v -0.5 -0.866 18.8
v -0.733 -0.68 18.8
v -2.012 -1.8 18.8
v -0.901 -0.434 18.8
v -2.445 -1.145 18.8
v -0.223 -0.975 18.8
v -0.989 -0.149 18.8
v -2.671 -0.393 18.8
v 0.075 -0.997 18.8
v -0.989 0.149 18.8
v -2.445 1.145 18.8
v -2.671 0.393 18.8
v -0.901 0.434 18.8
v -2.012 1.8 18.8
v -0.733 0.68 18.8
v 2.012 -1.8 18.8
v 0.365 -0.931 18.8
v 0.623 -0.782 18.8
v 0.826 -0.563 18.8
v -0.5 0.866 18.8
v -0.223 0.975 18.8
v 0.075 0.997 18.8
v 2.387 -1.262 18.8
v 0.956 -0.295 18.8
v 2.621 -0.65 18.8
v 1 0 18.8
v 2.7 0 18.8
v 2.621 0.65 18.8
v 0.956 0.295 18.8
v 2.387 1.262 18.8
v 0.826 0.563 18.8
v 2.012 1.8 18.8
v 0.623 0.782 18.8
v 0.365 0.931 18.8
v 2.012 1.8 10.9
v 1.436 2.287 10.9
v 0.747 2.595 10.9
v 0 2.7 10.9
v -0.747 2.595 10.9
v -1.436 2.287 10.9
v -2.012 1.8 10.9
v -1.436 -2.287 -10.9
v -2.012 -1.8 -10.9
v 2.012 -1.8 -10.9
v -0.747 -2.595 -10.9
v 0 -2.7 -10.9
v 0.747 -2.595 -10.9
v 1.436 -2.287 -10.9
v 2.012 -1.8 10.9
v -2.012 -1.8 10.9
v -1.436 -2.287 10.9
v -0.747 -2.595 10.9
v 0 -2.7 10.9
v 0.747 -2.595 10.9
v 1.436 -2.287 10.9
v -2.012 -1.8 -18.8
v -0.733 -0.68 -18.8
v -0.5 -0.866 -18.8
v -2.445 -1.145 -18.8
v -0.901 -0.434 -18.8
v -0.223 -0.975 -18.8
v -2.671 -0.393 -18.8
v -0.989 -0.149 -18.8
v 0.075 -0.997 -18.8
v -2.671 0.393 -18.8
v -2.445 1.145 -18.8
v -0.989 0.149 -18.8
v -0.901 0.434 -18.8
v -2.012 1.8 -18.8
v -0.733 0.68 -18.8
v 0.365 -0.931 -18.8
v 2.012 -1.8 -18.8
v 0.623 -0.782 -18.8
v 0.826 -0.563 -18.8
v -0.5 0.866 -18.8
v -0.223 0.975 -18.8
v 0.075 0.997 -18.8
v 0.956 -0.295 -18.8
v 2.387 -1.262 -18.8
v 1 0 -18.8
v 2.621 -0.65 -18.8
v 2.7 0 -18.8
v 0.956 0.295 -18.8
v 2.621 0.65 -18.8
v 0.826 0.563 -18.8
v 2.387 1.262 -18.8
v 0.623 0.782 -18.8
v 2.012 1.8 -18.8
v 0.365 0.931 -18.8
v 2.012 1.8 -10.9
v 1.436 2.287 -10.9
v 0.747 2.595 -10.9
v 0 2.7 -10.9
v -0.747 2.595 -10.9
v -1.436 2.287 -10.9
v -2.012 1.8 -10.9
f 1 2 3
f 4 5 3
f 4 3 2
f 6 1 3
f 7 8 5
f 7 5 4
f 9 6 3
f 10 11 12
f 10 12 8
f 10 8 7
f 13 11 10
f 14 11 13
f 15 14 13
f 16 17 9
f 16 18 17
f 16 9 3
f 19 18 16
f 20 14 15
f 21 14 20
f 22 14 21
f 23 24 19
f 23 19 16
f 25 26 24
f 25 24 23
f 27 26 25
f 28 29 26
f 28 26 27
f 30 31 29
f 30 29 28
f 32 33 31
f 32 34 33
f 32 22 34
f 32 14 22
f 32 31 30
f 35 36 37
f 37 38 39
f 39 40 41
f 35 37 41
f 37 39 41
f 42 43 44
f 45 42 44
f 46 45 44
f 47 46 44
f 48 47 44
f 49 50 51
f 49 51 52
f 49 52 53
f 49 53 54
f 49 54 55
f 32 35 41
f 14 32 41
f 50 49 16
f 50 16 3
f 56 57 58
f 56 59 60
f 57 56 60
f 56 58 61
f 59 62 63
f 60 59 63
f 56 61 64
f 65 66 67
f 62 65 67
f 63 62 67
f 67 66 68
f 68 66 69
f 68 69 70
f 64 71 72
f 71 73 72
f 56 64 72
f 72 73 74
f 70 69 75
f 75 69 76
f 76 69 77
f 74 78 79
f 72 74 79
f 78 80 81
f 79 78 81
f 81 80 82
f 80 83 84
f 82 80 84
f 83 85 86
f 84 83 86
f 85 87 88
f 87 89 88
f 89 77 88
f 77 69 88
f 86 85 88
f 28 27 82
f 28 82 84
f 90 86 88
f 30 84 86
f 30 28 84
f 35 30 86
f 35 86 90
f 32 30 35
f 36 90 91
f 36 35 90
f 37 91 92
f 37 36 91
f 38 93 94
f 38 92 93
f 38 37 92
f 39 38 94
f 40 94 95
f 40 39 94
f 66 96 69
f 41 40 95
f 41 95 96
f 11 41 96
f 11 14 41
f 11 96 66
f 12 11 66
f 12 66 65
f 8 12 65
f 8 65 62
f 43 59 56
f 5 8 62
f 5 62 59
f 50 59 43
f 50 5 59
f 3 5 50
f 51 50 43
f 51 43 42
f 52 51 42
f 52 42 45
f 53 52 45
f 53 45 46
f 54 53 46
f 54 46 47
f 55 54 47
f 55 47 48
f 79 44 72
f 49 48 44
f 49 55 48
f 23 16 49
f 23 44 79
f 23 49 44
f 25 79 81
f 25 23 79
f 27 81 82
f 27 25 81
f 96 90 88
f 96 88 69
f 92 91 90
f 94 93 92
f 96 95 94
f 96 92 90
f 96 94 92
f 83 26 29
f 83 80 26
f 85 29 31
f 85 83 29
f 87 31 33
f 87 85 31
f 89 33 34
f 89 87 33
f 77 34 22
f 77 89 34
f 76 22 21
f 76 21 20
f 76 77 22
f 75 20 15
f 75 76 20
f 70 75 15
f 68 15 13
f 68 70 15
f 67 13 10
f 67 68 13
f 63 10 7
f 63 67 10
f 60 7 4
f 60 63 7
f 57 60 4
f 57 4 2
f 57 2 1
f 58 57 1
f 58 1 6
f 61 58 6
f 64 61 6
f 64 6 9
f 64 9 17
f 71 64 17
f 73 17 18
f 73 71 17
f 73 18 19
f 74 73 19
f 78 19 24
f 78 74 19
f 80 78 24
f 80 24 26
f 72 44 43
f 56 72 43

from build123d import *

# Parameters (mm, degrees)
CROQUIS1_R              = 2.7
CROQUIS1_R_2            = 1
SALIENTE_EXTRUIR1_DEPTH = 18.8
CORTAR_EXTRUIR2_START   = -7.9
CORTAR_EXTRUIR2_DEPTH   = 7.9


with BuildPart() as part:
    # Croquis1 → Saliente-Extruir1 (new, symmetric)
    with BuildSketch(Plane.XY):
        Circle(CROQUIS1_R)
        Circle(CROQUIS1_R_2, mode=Mode.SUBTRACT)
    extrude(amount=SALIENTE_EXTRUIR1_DEPTH, both=True)

    # Croquis4 → Cortar-Extruir2 (cut)
    with BuildSketch(Plane(origin=(0, 0, -18.8), x_dir=(-1, 0, 0), z_dir=(0, 0, -1)).offset(CORTAR_EXTRUIR2_START)):
        with BuildLine():
            Line((-2.01246118, 1.8), (2.01246118, 1.8))
            ThreePointArc((2.01246118, 1.8), (0, 2.7), (-2.01246118, 1.8))
        make_face()
        with BuildLine():
            Line((-2.01246118, -1.8), (2.01246118, -1.8))
            ThreePointArc((2.01246118, -1.8), (0, -2.7), (-2.01246118, -1.8))
        make_face()
    cortar_extruir2 = extrude(amount=CORTAR_EXTRUIR2_DEPTH, mode=Mode.SUBTRACT)

    # Simetría1: Cortar-Extruir2 across plane
    add(cortar_extruir2.mirror(Plane.XY), mode=Mode.SUBTRACT)


solid = part.part
